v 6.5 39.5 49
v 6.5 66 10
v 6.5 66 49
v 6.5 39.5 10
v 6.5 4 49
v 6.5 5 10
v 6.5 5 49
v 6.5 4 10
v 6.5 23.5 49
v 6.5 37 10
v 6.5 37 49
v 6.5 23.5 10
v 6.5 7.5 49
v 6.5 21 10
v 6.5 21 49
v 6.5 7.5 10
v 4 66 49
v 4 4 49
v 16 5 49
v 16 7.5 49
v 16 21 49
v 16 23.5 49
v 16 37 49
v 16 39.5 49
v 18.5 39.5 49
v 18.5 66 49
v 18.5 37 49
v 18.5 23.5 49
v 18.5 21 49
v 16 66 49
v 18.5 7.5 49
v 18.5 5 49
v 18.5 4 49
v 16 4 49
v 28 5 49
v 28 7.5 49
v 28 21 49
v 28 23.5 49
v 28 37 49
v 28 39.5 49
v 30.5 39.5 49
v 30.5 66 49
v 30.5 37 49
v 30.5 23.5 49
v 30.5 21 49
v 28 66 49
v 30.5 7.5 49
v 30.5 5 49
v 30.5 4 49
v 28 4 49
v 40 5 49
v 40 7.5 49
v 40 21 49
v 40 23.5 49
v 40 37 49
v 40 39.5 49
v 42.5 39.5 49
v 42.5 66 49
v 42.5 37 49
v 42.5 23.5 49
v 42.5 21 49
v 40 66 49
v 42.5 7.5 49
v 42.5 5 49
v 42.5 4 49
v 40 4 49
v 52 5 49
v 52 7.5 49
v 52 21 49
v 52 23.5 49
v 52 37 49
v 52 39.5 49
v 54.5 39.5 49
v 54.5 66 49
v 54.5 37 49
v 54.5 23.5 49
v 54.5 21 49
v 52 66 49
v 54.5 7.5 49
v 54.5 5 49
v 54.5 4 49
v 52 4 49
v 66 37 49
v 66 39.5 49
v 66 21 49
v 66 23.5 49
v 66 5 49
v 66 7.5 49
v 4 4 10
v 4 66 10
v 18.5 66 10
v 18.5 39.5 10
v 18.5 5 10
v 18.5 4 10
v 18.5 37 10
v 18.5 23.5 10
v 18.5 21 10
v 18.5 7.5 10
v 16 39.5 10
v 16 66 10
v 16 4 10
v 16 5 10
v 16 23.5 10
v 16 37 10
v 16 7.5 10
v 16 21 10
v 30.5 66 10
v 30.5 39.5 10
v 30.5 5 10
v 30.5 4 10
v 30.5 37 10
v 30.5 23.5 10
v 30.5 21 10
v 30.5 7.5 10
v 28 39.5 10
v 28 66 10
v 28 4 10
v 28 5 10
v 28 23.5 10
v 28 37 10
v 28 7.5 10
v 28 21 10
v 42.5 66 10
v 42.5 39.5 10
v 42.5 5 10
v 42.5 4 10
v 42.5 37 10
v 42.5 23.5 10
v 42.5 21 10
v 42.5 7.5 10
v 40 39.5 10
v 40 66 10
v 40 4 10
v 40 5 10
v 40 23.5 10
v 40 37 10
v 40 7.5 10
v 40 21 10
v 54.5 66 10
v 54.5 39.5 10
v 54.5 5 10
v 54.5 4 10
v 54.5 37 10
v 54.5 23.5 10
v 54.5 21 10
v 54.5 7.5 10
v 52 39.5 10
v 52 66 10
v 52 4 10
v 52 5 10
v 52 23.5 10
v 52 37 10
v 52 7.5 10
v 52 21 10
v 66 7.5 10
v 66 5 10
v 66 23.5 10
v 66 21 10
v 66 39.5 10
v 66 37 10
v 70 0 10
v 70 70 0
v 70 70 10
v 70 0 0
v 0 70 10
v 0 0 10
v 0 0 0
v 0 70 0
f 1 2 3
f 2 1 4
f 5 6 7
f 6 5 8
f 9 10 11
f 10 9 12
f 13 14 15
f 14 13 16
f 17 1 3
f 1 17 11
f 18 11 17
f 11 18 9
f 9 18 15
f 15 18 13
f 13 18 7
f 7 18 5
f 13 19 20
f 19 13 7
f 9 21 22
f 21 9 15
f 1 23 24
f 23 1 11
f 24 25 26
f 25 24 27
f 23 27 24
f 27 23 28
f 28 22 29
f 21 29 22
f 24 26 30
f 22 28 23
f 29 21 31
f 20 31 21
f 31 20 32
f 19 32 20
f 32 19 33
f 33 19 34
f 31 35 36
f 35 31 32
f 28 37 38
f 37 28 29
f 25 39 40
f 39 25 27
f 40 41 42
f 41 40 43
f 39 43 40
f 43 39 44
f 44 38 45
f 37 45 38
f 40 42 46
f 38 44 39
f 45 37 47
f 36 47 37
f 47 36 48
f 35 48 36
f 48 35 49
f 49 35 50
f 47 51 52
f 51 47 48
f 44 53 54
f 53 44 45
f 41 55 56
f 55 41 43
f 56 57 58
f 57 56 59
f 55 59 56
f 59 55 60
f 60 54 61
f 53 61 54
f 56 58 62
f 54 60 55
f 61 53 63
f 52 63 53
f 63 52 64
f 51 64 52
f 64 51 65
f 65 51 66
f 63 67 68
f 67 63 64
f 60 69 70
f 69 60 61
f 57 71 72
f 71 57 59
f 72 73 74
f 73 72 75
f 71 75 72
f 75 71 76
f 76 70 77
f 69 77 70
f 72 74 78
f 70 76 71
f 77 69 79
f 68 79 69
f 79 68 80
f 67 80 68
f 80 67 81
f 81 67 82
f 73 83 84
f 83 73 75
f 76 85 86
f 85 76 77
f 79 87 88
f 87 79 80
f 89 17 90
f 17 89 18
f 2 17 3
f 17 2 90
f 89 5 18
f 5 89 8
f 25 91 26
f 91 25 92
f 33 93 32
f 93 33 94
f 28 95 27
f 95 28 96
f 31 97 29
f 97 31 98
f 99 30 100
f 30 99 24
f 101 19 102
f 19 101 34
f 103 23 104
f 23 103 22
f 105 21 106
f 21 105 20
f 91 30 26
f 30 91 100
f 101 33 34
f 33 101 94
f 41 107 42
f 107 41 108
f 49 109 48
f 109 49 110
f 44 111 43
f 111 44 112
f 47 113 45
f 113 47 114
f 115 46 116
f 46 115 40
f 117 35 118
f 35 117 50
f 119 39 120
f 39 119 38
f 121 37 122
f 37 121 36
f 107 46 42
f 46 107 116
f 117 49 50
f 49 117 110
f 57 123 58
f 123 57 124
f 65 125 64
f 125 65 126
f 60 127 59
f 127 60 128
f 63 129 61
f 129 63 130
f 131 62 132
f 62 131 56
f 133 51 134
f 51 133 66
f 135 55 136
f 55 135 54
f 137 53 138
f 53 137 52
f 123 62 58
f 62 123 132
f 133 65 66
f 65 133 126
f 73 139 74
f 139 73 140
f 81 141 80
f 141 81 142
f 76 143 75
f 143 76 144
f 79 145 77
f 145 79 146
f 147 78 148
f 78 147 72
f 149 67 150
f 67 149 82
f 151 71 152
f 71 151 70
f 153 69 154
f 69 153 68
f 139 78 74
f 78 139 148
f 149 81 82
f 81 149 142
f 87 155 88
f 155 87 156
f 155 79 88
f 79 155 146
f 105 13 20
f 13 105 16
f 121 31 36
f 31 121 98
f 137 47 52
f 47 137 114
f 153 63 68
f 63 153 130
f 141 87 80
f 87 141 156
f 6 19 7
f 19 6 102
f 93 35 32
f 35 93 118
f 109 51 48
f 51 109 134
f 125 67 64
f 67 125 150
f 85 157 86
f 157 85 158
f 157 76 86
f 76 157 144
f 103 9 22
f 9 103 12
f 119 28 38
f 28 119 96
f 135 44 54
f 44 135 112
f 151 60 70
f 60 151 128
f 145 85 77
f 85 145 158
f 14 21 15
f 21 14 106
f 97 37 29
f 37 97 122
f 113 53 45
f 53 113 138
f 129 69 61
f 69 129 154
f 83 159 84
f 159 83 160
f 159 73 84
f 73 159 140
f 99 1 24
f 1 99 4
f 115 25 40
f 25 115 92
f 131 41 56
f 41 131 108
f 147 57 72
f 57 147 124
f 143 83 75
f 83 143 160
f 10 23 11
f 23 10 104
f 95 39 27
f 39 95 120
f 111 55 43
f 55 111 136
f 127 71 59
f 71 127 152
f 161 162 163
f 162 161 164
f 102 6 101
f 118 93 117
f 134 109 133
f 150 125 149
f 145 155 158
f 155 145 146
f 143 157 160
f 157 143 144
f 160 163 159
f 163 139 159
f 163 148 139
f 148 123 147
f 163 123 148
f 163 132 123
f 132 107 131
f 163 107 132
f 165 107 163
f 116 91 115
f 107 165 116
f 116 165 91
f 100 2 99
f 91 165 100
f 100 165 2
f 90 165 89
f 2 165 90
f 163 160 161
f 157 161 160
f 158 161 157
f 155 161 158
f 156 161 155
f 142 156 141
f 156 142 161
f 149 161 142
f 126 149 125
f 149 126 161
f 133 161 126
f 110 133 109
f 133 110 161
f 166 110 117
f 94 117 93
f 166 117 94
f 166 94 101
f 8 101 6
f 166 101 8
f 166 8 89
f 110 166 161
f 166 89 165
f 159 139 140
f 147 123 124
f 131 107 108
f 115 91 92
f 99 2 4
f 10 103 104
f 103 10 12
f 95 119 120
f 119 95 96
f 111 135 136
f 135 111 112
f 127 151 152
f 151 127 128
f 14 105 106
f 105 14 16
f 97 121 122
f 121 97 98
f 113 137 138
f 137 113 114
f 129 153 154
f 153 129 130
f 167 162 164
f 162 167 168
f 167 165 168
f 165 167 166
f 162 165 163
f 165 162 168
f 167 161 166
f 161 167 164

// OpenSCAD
$fn = 32;

// ----------------------------------------------------------------------
// Heatsink: cross fin block
// ----------------------------------------------------------------------

// --- parameters (mm) ---
base_l = 70;              // base length, X
base_w = 70;              // base width, Y
base_t = 10;              // base plate thickness
fin_h = 40;               // fin height above the base
fin_t = 2.5;              // fin thickness
edge = 4;                 // margin from the base ends
pitch = 12;               // fin pitch
rib_pitch = 16;           // cross rib pitch

n_fins = floor((base_l - 2 * edge - fin_t) / pitch) + 1;  // fin count
total_h = base_t + fin_h - 1;  // overall height
n_ribs = floor((base_w - 2 * edge) / rib_pitch);  // rib count

union() {
  cube([base_l, base_w, base_t]);
  for (i = [0 : n_fins - 1])
    translate([edge + i * pitch, edge, base_t - 1])
      cube([fin_t, base_w - 2 * edge, fin_h]);
  for (i = [0 : n_ribs - 1])
    translate([edge, edge + 1 + i * rib_pitch, base_t - 1])
      cube([base_l - 2 * edge, fin_t, fin_h]);
}
